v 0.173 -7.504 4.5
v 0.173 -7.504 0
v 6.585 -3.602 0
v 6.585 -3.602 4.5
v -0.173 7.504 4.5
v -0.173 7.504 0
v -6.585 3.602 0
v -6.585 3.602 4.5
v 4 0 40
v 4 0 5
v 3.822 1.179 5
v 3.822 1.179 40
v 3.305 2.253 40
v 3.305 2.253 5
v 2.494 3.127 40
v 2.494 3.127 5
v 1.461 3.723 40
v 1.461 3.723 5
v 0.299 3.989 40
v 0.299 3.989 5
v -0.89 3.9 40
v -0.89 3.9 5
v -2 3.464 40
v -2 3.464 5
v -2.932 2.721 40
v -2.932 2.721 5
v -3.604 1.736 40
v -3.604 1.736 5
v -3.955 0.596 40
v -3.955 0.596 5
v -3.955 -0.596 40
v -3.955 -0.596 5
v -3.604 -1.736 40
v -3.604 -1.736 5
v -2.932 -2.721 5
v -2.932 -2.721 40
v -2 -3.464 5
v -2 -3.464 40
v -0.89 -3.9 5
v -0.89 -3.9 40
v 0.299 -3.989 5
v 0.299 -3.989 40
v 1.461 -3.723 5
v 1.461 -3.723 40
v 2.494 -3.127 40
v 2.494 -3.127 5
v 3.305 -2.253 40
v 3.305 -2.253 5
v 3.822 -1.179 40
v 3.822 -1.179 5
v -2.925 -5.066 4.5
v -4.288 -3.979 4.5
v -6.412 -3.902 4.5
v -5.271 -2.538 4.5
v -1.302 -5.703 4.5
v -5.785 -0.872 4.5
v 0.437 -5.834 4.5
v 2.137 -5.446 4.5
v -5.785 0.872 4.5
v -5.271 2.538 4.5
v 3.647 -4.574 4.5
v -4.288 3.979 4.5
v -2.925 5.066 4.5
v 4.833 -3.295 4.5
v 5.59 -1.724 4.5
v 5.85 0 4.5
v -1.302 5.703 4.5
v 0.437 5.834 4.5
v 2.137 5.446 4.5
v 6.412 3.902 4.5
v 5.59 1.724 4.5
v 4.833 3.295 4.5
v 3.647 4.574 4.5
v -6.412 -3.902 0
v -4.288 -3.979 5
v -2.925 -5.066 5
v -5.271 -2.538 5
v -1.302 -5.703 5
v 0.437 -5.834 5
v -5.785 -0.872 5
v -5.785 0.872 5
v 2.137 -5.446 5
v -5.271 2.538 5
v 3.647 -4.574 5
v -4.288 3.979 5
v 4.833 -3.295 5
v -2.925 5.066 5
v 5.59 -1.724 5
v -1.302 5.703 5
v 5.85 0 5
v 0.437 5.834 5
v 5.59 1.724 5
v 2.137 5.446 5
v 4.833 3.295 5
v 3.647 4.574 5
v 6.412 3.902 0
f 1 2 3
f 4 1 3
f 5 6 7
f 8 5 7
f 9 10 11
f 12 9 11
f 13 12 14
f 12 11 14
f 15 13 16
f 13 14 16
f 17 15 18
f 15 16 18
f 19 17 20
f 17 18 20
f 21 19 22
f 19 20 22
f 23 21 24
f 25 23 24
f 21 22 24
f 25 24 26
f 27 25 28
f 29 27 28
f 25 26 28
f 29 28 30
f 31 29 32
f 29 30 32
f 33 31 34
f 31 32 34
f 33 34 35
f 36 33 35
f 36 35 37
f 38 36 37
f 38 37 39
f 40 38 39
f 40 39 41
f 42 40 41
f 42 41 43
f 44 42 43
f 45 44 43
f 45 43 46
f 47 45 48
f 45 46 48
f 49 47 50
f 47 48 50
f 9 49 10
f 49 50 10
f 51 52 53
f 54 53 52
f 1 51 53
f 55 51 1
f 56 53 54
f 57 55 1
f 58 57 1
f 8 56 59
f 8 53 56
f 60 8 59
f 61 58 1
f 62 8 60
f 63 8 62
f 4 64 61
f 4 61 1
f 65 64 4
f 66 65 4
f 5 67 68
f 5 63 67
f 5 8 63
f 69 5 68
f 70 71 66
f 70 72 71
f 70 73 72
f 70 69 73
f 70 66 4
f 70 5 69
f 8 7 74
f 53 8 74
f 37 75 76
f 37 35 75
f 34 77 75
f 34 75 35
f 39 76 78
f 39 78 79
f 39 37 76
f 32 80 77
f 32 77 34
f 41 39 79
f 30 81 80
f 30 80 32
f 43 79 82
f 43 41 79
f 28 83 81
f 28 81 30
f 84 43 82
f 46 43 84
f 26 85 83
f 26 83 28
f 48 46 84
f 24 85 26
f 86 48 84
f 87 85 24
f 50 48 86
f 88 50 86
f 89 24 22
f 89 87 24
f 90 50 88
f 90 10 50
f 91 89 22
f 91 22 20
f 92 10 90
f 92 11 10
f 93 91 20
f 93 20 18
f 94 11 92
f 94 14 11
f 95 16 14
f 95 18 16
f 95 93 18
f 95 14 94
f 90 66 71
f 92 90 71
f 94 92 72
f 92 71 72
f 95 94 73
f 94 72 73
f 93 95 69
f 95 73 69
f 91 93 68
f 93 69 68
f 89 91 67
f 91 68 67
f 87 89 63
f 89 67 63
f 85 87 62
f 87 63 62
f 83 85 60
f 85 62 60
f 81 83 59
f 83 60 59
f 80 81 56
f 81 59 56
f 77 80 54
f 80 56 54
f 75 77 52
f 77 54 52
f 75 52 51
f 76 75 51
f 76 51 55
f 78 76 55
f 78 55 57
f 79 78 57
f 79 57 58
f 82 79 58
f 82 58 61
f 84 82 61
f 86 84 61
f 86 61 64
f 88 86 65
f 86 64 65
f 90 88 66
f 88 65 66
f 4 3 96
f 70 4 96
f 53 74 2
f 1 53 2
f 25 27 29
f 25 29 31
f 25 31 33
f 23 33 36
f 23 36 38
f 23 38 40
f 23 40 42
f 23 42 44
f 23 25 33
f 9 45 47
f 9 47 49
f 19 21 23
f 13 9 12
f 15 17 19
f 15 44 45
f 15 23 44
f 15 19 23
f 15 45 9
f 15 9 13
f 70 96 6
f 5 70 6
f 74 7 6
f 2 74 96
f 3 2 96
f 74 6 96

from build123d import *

# Parameters (mm, degrees)
BOSS_EXTRUDE1_DEPTH = 4.5
SKETCH2_R           = 5.85
BOSS_EXTRUDE2_DEPTH = 0.5
SKETCH3_R           = 4
BOSS_EXTRUDE3_DEPTH = 35


with BuildPart() as part:
    # Sketch1 → Boss-Extrude1 (new body)
    with BuildSketch(Plane.XY):
        Polygon((-6.411545587, -3.901975976), (0.173437527, -7.503549344), (6.584983114, -3.601573368), (6.411545587, 3.901975976), (-0.173437527, 7.503549344), (-6.584983114, 3.601573368), align=None)
    extrude(amount=BOSS_EXTRUDE1_DEPTH)

    # Sketch2 → Boss-Extrude2 (add)
    with BuildSketch(Plane.XY.offset(4.5)):
        Circle(SKETCH2_R)
    extrude(amount=BOSS_EXTRUDE2_DEPTH)

    # Sketch3 → Boss-Extrude3 (add)
    with BuildSketch(Plane.XY.offset(5)):
        Circle(SKETCH3_R)
    extrude(amount=BOSS_EXTRUDE3_DEPTH)


solid = part.part
